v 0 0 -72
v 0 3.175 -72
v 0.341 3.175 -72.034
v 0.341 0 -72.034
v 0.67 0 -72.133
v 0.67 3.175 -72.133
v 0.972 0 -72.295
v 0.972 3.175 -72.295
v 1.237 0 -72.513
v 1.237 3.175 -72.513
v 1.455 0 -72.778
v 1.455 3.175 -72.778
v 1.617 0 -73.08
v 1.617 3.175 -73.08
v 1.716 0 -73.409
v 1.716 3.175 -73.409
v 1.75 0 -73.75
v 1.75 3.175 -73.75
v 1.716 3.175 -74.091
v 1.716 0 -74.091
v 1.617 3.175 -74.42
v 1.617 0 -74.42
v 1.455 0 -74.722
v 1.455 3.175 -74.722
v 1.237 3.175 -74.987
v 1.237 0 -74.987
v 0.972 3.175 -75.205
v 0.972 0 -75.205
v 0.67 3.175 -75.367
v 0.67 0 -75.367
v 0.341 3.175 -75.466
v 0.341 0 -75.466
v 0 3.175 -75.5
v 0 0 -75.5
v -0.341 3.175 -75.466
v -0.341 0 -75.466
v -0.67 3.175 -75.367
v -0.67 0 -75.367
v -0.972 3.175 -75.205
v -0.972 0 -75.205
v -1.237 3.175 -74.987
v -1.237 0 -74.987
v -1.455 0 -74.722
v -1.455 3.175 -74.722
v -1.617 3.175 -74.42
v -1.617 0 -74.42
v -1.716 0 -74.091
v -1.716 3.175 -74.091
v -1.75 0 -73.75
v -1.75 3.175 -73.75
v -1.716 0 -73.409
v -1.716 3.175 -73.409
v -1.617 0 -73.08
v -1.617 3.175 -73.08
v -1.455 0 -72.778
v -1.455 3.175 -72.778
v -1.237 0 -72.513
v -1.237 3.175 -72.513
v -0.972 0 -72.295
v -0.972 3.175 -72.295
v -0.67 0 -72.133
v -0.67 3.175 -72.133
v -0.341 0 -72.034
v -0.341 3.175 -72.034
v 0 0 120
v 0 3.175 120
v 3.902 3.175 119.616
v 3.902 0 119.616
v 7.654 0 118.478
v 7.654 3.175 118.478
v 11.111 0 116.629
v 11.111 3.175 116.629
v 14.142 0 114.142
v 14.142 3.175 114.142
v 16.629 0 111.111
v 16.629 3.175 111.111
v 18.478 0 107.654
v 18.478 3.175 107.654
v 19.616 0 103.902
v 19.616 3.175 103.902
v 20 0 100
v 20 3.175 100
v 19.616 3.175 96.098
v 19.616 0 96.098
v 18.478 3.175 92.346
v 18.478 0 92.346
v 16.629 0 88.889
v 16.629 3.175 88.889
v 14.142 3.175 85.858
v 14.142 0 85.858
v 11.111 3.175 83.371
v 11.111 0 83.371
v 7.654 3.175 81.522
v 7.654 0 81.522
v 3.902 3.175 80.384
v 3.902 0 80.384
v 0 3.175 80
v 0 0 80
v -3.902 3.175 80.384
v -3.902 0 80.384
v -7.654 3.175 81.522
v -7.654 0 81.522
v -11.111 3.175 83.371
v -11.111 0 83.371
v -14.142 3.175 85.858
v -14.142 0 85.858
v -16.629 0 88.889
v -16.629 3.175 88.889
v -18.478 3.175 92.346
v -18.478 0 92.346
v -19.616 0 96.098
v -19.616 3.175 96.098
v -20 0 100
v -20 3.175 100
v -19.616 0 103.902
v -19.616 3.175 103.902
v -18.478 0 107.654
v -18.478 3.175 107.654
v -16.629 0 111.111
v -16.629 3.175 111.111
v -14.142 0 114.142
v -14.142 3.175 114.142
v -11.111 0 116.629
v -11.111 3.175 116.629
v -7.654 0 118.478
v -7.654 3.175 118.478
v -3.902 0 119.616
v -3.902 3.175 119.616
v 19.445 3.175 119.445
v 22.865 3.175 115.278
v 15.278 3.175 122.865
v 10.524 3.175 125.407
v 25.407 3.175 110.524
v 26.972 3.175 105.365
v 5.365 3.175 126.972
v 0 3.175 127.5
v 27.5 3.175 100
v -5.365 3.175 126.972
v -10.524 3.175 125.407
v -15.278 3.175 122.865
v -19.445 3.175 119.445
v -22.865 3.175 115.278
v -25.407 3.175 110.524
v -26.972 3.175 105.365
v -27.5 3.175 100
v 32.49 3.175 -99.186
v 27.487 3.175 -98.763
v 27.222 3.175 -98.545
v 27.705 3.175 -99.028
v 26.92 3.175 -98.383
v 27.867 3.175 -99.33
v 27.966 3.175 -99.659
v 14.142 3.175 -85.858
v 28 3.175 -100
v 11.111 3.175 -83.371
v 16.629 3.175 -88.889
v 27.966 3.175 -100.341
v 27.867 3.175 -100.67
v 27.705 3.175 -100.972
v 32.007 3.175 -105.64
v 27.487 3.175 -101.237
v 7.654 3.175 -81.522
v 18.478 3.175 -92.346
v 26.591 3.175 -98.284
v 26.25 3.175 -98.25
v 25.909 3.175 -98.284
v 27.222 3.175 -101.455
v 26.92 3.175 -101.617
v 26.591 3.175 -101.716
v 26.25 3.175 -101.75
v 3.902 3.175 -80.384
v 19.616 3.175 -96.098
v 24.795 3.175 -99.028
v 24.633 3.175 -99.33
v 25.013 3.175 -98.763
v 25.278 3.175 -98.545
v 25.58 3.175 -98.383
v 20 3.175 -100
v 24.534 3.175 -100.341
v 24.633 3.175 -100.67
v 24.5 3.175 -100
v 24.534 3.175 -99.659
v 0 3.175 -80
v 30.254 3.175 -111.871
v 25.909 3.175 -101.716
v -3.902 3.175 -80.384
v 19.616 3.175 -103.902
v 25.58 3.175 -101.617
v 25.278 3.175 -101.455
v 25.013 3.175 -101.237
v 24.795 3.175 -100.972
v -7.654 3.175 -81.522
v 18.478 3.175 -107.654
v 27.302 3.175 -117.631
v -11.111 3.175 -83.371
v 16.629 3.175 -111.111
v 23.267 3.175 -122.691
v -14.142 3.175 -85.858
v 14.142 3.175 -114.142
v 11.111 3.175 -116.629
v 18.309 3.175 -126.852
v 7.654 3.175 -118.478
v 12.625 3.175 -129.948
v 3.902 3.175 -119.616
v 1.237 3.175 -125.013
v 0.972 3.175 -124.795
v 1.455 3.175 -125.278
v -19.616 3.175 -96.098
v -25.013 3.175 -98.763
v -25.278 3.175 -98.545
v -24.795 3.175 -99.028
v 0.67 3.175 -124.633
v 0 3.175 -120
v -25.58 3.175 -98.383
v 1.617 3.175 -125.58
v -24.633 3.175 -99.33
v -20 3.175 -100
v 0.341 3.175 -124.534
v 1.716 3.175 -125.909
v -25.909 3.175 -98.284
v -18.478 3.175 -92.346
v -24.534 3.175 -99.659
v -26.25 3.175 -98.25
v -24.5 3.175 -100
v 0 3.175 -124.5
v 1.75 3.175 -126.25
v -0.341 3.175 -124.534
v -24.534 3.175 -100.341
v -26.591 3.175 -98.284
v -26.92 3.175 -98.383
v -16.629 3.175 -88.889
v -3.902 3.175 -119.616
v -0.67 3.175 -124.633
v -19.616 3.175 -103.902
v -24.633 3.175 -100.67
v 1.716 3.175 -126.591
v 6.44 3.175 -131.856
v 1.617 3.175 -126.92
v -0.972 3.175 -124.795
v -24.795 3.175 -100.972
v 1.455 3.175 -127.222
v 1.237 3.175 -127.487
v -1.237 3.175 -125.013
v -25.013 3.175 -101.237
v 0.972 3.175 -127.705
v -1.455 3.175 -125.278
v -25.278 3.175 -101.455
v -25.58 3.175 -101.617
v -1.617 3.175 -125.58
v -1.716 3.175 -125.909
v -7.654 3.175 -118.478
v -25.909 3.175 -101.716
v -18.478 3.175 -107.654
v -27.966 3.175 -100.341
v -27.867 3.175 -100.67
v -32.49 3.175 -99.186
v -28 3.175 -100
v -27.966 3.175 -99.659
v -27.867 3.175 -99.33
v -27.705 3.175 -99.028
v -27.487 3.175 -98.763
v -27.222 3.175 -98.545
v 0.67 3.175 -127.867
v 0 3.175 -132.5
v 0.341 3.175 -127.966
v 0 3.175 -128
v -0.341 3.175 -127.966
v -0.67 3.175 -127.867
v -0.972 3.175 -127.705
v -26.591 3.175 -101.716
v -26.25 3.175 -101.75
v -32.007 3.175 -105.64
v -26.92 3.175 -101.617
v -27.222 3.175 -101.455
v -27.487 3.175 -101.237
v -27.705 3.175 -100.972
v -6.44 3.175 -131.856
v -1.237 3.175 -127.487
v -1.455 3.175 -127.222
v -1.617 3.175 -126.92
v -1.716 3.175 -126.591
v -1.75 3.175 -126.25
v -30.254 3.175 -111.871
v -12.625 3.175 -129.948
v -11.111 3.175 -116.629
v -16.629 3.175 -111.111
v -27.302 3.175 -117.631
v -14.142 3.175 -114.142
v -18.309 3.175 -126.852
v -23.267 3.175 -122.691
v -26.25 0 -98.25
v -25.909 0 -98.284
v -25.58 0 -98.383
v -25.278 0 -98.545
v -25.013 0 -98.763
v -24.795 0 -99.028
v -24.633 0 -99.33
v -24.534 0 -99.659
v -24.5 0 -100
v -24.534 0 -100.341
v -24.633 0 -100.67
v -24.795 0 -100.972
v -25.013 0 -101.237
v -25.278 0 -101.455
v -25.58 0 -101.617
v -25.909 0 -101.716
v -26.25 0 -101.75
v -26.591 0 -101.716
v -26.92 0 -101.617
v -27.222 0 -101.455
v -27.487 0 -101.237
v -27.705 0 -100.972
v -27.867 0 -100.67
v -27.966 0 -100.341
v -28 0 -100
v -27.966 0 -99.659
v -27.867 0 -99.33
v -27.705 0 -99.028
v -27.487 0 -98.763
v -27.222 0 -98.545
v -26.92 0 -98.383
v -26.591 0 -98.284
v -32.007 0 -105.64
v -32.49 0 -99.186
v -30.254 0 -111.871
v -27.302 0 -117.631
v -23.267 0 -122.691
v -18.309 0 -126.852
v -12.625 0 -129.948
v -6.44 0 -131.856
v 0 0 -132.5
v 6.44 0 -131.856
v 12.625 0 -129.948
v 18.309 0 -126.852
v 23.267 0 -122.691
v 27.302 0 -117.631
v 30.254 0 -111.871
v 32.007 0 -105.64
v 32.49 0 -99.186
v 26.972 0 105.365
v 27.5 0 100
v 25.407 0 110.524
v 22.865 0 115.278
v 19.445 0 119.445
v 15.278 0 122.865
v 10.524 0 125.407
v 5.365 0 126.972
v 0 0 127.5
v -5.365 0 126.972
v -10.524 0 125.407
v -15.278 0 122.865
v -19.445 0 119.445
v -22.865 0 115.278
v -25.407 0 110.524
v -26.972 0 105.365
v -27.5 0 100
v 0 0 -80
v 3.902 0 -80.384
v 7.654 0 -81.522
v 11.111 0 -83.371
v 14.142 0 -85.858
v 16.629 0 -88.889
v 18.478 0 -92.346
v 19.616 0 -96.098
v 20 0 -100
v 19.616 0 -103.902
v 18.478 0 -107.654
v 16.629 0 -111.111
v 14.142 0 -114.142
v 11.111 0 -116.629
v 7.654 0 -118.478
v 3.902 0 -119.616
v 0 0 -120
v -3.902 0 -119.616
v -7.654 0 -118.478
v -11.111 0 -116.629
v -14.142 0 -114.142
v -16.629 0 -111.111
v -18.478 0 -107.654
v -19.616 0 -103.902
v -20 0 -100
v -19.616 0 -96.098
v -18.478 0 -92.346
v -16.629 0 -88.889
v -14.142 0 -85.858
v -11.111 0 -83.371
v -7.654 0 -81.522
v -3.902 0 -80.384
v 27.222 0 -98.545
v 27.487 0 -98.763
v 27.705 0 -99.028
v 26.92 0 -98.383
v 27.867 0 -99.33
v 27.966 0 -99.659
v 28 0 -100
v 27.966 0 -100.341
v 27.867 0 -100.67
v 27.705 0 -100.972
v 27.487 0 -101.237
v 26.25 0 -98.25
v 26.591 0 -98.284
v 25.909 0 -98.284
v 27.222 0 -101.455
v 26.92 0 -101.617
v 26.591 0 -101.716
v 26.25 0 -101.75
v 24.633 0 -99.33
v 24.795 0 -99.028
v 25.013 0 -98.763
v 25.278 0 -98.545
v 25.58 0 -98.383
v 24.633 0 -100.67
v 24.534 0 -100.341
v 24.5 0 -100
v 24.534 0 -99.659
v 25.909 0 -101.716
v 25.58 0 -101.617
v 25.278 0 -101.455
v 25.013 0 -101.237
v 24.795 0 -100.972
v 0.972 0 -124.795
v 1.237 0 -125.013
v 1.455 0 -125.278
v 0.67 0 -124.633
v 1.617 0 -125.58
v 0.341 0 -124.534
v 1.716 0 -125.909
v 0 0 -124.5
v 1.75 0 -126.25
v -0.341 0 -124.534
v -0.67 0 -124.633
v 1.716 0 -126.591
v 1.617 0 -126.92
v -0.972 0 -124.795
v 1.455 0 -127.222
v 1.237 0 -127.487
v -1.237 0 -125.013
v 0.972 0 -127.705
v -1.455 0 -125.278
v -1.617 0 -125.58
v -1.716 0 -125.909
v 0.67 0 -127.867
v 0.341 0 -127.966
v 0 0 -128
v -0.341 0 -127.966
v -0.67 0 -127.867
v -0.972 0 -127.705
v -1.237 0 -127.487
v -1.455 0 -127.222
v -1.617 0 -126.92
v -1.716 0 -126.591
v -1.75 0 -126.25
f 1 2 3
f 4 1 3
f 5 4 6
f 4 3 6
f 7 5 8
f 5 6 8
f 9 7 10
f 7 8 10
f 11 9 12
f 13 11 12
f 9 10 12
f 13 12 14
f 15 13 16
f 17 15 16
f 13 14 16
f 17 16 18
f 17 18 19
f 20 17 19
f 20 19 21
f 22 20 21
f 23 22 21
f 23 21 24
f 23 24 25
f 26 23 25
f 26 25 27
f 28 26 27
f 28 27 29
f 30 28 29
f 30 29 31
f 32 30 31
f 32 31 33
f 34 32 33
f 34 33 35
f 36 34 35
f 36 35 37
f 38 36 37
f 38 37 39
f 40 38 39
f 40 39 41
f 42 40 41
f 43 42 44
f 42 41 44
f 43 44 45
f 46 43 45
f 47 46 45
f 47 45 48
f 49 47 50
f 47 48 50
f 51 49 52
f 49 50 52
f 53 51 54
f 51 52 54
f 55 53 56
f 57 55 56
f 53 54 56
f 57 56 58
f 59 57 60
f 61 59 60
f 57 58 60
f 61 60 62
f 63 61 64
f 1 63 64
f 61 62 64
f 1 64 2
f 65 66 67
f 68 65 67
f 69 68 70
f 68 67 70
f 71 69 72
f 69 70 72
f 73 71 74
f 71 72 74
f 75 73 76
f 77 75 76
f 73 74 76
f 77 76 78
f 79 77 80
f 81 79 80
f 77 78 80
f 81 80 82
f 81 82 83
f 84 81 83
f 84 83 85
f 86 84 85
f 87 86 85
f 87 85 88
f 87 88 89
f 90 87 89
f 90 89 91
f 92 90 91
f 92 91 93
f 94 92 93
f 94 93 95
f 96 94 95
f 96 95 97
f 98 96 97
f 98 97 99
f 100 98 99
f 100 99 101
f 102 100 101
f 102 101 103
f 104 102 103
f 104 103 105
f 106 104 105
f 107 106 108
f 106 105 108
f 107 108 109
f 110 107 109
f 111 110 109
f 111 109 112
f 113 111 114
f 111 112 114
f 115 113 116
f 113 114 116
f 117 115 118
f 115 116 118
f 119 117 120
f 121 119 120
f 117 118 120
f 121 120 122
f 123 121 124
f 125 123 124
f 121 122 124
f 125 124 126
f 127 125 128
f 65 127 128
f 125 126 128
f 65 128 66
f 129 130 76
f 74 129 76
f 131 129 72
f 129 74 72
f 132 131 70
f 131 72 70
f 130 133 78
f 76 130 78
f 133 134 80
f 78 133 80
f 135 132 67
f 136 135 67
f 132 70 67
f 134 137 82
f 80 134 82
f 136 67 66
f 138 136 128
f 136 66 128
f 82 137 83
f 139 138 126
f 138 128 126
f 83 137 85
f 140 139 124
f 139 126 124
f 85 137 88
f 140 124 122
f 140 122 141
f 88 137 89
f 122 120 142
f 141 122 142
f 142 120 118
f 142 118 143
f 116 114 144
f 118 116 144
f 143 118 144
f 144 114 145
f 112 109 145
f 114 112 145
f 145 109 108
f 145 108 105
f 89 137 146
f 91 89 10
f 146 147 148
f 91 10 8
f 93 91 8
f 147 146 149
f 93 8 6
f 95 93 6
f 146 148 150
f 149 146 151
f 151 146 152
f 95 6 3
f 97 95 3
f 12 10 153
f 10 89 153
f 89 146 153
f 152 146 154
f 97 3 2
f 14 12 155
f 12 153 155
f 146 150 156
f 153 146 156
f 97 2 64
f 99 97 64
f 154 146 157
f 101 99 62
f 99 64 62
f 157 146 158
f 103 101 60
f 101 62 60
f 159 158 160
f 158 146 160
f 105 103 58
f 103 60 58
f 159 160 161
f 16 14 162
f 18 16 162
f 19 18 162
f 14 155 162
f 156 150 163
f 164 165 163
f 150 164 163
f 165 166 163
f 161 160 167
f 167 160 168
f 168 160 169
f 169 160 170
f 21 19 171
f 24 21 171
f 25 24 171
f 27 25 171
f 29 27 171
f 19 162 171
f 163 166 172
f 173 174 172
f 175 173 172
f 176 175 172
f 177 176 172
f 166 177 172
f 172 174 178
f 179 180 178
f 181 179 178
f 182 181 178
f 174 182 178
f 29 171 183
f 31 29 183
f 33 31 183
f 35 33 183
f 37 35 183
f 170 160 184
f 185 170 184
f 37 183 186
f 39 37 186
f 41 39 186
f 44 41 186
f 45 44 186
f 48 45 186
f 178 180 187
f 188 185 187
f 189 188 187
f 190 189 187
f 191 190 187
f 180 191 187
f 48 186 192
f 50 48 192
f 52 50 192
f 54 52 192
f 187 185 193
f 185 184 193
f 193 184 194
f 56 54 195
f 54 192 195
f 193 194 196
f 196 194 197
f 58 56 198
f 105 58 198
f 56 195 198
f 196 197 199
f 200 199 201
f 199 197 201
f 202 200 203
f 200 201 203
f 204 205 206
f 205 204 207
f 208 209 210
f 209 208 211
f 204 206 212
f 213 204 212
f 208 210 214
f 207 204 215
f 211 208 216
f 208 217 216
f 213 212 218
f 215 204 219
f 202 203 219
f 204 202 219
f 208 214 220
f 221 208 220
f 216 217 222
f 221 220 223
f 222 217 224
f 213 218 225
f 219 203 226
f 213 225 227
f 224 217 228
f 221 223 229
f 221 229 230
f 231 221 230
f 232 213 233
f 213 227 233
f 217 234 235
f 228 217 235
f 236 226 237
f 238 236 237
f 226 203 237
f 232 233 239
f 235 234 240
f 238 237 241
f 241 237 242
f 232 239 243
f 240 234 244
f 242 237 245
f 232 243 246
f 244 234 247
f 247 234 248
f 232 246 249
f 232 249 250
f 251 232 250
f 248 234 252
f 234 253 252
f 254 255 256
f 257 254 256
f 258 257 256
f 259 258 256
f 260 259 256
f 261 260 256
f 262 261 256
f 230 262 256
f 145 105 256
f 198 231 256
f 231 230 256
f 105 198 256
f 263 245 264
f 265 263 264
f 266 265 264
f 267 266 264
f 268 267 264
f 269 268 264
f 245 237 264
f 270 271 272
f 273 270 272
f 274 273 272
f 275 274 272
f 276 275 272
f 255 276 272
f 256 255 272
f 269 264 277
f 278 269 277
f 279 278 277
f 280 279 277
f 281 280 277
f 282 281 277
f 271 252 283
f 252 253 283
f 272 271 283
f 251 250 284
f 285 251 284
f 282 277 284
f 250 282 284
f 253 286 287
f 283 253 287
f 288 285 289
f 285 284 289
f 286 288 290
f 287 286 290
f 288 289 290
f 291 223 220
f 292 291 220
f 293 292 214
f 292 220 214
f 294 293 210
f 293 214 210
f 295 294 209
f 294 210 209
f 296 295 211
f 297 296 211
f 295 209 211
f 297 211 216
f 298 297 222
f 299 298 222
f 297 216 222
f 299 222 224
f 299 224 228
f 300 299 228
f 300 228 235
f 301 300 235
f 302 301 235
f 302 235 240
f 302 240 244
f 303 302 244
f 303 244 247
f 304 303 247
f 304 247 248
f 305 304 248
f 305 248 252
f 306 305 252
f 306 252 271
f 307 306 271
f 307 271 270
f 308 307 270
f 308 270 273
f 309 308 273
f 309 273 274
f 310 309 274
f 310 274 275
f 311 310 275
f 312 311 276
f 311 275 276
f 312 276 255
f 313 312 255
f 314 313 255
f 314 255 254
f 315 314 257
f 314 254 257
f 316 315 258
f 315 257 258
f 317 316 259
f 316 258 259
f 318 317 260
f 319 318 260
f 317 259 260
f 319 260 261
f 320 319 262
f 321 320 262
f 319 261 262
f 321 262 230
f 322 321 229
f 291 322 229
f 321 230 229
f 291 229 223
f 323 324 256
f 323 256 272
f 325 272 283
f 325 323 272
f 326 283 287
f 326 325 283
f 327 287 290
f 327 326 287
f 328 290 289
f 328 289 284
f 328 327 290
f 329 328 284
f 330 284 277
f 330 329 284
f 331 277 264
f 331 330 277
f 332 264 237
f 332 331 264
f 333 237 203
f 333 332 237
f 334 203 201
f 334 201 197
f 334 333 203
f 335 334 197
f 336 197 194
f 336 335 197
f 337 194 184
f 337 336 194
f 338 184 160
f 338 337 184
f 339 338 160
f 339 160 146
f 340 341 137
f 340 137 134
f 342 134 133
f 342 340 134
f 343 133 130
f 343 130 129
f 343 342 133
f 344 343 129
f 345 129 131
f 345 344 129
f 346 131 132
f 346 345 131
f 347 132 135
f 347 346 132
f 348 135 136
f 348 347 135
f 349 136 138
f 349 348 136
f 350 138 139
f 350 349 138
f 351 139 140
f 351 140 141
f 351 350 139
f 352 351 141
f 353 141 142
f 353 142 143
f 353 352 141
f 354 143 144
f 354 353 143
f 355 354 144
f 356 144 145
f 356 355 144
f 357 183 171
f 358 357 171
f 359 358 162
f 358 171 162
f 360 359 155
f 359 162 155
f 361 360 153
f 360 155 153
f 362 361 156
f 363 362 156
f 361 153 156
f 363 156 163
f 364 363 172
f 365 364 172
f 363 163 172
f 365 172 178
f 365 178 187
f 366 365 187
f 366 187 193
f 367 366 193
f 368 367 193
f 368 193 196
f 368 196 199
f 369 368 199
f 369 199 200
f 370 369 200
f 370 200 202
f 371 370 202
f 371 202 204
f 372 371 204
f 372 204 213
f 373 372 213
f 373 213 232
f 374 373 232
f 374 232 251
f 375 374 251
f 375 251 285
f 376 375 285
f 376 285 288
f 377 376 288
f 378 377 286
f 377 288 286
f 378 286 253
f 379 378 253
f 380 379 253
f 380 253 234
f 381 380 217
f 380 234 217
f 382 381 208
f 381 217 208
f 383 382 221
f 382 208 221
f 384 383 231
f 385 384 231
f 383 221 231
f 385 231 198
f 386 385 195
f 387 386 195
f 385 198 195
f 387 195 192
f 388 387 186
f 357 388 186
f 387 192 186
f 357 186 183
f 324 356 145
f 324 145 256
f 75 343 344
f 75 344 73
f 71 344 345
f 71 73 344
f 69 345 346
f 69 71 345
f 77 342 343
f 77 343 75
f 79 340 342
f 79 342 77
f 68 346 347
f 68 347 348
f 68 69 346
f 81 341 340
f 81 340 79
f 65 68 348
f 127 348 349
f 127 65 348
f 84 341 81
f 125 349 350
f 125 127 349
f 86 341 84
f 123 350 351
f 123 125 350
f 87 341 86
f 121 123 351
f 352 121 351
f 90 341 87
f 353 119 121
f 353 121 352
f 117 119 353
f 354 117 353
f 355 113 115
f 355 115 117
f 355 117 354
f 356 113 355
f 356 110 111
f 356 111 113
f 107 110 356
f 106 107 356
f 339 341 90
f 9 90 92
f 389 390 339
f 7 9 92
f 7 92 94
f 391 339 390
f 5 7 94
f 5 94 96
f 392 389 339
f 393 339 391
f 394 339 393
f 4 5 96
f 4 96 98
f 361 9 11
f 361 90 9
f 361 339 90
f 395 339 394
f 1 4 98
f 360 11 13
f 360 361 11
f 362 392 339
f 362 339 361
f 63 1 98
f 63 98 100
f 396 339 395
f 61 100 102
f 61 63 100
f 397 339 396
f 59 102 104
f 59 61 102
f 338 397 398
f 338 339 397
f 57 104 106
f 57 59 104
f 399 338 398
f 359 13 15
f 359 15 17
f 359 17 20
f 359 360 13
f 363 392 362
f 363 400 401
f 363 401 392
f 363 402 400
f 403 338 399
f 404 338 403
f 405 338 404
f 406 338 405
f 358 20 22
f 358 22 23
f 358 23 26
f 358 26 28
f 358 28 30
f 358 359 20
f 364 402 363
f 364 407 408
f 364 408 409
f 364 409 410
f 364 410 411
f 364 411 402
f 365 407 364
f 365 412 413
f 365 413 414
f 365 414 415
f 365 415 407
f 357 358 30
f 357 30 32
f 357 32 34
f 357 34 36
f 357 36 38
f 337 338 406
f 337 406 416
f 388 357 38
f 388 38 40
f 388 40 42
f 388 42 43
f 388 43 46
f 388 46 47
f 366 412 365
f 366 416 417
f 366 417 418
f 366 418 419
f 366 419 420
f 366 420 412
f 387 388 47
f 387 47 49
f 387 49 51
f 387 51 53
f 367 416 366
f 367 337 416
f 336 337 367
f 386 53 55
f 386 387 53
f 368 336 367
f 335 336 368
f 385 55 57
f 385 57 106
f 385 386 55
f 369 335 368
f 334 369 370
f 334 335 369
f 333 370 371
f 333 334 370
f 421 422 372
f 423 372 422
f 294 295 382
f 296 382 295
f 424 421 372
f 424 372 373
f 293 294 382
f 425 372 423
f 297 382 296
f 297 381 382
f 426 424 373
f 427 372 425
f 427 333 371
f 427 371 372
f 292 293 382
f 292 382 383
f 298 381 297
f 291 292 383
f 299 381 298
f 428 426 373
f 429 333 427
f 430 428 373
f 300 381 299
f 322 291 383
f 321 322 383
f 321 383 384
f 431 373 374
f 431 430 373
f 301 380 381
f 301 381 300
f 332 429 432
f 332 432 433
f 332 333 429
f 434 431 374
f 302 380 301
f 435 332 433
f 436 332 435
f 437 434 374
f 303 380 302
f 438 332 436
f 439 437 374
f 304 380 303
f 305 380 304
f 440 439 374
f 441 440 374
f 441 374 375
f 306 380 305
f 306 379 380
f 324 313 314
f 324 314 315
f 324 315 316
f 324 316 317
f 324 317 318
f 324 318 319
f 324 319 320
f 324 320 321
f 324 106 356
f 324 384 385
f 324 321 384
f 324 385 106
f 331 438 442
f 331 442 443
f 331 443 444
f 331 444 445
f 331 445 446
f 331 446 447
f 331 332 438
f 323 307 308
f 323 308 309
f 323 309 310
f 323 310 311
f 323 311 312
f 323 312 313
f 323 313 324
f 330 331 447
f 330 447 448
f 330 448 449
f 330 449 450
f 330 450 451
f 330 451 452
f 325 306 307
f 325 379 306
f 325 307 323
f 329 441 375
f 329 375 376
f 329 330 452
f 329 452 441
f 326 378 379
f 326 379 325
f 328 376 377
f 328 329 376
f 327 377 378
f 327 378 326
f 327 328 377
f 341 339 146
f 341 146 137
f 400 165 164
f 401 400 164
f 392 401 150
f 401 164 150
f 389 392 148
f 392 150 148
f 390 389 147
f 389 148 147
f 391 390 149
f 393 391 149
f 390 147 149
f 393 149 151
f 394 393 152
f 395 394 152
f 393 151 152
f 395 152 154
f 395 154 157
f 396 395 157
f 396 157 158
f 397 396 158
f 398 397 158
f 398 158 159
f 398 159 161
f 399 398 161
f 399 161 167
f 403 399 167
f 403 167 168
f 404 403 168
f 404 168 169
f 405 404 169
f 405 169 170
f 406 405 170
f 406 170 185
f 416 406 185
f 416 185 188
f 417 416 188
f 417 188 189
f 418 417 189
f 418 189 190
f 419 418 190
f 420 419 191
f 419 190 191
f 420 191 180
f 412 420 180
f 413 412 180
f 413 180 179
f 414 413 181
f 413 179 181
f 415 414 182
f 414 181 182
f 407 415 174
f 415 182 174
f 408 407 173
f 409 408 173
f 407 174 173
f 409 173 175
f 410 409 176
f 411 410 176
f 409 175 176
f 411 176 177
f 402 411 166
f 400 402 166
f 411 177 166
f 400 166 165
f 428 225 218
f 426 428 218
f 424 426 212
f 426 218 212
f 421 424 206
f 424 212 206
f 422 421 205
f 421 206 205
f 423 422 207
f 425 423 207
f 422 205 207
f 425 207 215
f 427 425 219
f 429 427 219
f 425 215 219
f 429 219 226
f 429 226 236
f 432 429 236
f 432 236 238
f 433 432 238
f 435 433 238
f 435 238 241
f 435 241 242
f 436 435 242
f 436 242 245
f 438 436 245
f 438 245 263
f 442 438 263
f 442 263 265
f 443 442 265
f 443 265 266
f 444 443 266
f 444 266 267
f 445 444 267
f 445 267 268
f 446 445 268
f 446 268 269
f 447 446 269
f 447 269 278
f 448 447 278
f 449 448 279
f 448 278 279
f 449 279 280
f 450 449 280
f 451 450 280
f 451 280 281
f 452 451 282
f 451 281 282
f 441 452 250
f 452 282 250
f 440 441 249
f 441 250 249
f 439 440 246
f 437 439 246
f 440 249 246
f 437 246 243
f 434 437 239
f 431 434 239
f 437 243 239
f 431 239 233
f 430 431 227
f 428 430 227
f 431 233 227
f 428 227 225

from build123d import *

# Parameters (mm, degrees)
BOSS_EXTRUDE1_DEPTH     = 3.175
SKETCH2_R               = 20
CUT_EXTRUDE1_DEPTH      = 137.464576448
ESQUISSE2_R             = 1.75
ENL_V_MAT_EXTRU_1_DEPTH = 137.464576448


with BuildPart() as part:
    # Sketch1 → Boss-Extrude1 (new body)
    with BuildSketch(Plane(origin=(0, 0, 0), x_dir=(1, 0, 0), z_dir=(0, 1, 0))):
        with BuildLine():
            Line((-27.5, -100), (-32.489807083, 99.186098474))
            ThreePointArc((-32.489807083, 99.186098474), (0, 132.5), (32.489807083, 99.186098474))
            Line((32.489807083, 99.186098474), (27.5, -100))
            ThreePointArc((27.5, -100), (0, -127.5), (-27.5, -100))
        make_face()
    extrude(amount=BOSS_EXTRUDE1_DEPTH)

    # Sketch2 → Cut-Extrude1 (cut, through all)
    with BuildSketch(Plane(origin=(0, 3.175, 0), x_dir=(1, 0, 0), z_dir=(0, 1, 0))):
        with Locations(Location((0, -100, 0), (0, 0, 270))):
            Circle(SKETCH2_R)
        with Locations(Location((0, 100, 0), (0, 0, 270))):
            Circle(SKETCH2_R)
    extrude(amount=-CUT_EXTRUDE1_DEPTH, mode=Mode.SUBTRACT)

    # Esquisse2 → Enlèv. mat.-Extru.1 (cut, through all)
    with BuildSketch(Plane(origin=(0, 3.175, 0), x_dir=(1, 0, 0), z_dir=(0, 1, 0))):
        with Locations(Location((0, 73.75, 0), (0, 0, 270))):
            Circle(ESQUISSE2_R)
        with Locations(Location((26.25, 100, 0), (0, 0, 270))):
            Circle(ESQUISSE2_R)
        with Locations(Location((0, 126.25, 0), (0, 0, 270))):
            Circle(ESQUISSE2_R)
        with Locations(Location((-26.25, 100, 0), (0, 0, 270))):
            Circle(ESQUISSE2_R)
    extrude(amount=-ENL_V_MAT_EXTRU_1_DEPTH, mode=Mode.SUBTRACT)


solid = part.part
